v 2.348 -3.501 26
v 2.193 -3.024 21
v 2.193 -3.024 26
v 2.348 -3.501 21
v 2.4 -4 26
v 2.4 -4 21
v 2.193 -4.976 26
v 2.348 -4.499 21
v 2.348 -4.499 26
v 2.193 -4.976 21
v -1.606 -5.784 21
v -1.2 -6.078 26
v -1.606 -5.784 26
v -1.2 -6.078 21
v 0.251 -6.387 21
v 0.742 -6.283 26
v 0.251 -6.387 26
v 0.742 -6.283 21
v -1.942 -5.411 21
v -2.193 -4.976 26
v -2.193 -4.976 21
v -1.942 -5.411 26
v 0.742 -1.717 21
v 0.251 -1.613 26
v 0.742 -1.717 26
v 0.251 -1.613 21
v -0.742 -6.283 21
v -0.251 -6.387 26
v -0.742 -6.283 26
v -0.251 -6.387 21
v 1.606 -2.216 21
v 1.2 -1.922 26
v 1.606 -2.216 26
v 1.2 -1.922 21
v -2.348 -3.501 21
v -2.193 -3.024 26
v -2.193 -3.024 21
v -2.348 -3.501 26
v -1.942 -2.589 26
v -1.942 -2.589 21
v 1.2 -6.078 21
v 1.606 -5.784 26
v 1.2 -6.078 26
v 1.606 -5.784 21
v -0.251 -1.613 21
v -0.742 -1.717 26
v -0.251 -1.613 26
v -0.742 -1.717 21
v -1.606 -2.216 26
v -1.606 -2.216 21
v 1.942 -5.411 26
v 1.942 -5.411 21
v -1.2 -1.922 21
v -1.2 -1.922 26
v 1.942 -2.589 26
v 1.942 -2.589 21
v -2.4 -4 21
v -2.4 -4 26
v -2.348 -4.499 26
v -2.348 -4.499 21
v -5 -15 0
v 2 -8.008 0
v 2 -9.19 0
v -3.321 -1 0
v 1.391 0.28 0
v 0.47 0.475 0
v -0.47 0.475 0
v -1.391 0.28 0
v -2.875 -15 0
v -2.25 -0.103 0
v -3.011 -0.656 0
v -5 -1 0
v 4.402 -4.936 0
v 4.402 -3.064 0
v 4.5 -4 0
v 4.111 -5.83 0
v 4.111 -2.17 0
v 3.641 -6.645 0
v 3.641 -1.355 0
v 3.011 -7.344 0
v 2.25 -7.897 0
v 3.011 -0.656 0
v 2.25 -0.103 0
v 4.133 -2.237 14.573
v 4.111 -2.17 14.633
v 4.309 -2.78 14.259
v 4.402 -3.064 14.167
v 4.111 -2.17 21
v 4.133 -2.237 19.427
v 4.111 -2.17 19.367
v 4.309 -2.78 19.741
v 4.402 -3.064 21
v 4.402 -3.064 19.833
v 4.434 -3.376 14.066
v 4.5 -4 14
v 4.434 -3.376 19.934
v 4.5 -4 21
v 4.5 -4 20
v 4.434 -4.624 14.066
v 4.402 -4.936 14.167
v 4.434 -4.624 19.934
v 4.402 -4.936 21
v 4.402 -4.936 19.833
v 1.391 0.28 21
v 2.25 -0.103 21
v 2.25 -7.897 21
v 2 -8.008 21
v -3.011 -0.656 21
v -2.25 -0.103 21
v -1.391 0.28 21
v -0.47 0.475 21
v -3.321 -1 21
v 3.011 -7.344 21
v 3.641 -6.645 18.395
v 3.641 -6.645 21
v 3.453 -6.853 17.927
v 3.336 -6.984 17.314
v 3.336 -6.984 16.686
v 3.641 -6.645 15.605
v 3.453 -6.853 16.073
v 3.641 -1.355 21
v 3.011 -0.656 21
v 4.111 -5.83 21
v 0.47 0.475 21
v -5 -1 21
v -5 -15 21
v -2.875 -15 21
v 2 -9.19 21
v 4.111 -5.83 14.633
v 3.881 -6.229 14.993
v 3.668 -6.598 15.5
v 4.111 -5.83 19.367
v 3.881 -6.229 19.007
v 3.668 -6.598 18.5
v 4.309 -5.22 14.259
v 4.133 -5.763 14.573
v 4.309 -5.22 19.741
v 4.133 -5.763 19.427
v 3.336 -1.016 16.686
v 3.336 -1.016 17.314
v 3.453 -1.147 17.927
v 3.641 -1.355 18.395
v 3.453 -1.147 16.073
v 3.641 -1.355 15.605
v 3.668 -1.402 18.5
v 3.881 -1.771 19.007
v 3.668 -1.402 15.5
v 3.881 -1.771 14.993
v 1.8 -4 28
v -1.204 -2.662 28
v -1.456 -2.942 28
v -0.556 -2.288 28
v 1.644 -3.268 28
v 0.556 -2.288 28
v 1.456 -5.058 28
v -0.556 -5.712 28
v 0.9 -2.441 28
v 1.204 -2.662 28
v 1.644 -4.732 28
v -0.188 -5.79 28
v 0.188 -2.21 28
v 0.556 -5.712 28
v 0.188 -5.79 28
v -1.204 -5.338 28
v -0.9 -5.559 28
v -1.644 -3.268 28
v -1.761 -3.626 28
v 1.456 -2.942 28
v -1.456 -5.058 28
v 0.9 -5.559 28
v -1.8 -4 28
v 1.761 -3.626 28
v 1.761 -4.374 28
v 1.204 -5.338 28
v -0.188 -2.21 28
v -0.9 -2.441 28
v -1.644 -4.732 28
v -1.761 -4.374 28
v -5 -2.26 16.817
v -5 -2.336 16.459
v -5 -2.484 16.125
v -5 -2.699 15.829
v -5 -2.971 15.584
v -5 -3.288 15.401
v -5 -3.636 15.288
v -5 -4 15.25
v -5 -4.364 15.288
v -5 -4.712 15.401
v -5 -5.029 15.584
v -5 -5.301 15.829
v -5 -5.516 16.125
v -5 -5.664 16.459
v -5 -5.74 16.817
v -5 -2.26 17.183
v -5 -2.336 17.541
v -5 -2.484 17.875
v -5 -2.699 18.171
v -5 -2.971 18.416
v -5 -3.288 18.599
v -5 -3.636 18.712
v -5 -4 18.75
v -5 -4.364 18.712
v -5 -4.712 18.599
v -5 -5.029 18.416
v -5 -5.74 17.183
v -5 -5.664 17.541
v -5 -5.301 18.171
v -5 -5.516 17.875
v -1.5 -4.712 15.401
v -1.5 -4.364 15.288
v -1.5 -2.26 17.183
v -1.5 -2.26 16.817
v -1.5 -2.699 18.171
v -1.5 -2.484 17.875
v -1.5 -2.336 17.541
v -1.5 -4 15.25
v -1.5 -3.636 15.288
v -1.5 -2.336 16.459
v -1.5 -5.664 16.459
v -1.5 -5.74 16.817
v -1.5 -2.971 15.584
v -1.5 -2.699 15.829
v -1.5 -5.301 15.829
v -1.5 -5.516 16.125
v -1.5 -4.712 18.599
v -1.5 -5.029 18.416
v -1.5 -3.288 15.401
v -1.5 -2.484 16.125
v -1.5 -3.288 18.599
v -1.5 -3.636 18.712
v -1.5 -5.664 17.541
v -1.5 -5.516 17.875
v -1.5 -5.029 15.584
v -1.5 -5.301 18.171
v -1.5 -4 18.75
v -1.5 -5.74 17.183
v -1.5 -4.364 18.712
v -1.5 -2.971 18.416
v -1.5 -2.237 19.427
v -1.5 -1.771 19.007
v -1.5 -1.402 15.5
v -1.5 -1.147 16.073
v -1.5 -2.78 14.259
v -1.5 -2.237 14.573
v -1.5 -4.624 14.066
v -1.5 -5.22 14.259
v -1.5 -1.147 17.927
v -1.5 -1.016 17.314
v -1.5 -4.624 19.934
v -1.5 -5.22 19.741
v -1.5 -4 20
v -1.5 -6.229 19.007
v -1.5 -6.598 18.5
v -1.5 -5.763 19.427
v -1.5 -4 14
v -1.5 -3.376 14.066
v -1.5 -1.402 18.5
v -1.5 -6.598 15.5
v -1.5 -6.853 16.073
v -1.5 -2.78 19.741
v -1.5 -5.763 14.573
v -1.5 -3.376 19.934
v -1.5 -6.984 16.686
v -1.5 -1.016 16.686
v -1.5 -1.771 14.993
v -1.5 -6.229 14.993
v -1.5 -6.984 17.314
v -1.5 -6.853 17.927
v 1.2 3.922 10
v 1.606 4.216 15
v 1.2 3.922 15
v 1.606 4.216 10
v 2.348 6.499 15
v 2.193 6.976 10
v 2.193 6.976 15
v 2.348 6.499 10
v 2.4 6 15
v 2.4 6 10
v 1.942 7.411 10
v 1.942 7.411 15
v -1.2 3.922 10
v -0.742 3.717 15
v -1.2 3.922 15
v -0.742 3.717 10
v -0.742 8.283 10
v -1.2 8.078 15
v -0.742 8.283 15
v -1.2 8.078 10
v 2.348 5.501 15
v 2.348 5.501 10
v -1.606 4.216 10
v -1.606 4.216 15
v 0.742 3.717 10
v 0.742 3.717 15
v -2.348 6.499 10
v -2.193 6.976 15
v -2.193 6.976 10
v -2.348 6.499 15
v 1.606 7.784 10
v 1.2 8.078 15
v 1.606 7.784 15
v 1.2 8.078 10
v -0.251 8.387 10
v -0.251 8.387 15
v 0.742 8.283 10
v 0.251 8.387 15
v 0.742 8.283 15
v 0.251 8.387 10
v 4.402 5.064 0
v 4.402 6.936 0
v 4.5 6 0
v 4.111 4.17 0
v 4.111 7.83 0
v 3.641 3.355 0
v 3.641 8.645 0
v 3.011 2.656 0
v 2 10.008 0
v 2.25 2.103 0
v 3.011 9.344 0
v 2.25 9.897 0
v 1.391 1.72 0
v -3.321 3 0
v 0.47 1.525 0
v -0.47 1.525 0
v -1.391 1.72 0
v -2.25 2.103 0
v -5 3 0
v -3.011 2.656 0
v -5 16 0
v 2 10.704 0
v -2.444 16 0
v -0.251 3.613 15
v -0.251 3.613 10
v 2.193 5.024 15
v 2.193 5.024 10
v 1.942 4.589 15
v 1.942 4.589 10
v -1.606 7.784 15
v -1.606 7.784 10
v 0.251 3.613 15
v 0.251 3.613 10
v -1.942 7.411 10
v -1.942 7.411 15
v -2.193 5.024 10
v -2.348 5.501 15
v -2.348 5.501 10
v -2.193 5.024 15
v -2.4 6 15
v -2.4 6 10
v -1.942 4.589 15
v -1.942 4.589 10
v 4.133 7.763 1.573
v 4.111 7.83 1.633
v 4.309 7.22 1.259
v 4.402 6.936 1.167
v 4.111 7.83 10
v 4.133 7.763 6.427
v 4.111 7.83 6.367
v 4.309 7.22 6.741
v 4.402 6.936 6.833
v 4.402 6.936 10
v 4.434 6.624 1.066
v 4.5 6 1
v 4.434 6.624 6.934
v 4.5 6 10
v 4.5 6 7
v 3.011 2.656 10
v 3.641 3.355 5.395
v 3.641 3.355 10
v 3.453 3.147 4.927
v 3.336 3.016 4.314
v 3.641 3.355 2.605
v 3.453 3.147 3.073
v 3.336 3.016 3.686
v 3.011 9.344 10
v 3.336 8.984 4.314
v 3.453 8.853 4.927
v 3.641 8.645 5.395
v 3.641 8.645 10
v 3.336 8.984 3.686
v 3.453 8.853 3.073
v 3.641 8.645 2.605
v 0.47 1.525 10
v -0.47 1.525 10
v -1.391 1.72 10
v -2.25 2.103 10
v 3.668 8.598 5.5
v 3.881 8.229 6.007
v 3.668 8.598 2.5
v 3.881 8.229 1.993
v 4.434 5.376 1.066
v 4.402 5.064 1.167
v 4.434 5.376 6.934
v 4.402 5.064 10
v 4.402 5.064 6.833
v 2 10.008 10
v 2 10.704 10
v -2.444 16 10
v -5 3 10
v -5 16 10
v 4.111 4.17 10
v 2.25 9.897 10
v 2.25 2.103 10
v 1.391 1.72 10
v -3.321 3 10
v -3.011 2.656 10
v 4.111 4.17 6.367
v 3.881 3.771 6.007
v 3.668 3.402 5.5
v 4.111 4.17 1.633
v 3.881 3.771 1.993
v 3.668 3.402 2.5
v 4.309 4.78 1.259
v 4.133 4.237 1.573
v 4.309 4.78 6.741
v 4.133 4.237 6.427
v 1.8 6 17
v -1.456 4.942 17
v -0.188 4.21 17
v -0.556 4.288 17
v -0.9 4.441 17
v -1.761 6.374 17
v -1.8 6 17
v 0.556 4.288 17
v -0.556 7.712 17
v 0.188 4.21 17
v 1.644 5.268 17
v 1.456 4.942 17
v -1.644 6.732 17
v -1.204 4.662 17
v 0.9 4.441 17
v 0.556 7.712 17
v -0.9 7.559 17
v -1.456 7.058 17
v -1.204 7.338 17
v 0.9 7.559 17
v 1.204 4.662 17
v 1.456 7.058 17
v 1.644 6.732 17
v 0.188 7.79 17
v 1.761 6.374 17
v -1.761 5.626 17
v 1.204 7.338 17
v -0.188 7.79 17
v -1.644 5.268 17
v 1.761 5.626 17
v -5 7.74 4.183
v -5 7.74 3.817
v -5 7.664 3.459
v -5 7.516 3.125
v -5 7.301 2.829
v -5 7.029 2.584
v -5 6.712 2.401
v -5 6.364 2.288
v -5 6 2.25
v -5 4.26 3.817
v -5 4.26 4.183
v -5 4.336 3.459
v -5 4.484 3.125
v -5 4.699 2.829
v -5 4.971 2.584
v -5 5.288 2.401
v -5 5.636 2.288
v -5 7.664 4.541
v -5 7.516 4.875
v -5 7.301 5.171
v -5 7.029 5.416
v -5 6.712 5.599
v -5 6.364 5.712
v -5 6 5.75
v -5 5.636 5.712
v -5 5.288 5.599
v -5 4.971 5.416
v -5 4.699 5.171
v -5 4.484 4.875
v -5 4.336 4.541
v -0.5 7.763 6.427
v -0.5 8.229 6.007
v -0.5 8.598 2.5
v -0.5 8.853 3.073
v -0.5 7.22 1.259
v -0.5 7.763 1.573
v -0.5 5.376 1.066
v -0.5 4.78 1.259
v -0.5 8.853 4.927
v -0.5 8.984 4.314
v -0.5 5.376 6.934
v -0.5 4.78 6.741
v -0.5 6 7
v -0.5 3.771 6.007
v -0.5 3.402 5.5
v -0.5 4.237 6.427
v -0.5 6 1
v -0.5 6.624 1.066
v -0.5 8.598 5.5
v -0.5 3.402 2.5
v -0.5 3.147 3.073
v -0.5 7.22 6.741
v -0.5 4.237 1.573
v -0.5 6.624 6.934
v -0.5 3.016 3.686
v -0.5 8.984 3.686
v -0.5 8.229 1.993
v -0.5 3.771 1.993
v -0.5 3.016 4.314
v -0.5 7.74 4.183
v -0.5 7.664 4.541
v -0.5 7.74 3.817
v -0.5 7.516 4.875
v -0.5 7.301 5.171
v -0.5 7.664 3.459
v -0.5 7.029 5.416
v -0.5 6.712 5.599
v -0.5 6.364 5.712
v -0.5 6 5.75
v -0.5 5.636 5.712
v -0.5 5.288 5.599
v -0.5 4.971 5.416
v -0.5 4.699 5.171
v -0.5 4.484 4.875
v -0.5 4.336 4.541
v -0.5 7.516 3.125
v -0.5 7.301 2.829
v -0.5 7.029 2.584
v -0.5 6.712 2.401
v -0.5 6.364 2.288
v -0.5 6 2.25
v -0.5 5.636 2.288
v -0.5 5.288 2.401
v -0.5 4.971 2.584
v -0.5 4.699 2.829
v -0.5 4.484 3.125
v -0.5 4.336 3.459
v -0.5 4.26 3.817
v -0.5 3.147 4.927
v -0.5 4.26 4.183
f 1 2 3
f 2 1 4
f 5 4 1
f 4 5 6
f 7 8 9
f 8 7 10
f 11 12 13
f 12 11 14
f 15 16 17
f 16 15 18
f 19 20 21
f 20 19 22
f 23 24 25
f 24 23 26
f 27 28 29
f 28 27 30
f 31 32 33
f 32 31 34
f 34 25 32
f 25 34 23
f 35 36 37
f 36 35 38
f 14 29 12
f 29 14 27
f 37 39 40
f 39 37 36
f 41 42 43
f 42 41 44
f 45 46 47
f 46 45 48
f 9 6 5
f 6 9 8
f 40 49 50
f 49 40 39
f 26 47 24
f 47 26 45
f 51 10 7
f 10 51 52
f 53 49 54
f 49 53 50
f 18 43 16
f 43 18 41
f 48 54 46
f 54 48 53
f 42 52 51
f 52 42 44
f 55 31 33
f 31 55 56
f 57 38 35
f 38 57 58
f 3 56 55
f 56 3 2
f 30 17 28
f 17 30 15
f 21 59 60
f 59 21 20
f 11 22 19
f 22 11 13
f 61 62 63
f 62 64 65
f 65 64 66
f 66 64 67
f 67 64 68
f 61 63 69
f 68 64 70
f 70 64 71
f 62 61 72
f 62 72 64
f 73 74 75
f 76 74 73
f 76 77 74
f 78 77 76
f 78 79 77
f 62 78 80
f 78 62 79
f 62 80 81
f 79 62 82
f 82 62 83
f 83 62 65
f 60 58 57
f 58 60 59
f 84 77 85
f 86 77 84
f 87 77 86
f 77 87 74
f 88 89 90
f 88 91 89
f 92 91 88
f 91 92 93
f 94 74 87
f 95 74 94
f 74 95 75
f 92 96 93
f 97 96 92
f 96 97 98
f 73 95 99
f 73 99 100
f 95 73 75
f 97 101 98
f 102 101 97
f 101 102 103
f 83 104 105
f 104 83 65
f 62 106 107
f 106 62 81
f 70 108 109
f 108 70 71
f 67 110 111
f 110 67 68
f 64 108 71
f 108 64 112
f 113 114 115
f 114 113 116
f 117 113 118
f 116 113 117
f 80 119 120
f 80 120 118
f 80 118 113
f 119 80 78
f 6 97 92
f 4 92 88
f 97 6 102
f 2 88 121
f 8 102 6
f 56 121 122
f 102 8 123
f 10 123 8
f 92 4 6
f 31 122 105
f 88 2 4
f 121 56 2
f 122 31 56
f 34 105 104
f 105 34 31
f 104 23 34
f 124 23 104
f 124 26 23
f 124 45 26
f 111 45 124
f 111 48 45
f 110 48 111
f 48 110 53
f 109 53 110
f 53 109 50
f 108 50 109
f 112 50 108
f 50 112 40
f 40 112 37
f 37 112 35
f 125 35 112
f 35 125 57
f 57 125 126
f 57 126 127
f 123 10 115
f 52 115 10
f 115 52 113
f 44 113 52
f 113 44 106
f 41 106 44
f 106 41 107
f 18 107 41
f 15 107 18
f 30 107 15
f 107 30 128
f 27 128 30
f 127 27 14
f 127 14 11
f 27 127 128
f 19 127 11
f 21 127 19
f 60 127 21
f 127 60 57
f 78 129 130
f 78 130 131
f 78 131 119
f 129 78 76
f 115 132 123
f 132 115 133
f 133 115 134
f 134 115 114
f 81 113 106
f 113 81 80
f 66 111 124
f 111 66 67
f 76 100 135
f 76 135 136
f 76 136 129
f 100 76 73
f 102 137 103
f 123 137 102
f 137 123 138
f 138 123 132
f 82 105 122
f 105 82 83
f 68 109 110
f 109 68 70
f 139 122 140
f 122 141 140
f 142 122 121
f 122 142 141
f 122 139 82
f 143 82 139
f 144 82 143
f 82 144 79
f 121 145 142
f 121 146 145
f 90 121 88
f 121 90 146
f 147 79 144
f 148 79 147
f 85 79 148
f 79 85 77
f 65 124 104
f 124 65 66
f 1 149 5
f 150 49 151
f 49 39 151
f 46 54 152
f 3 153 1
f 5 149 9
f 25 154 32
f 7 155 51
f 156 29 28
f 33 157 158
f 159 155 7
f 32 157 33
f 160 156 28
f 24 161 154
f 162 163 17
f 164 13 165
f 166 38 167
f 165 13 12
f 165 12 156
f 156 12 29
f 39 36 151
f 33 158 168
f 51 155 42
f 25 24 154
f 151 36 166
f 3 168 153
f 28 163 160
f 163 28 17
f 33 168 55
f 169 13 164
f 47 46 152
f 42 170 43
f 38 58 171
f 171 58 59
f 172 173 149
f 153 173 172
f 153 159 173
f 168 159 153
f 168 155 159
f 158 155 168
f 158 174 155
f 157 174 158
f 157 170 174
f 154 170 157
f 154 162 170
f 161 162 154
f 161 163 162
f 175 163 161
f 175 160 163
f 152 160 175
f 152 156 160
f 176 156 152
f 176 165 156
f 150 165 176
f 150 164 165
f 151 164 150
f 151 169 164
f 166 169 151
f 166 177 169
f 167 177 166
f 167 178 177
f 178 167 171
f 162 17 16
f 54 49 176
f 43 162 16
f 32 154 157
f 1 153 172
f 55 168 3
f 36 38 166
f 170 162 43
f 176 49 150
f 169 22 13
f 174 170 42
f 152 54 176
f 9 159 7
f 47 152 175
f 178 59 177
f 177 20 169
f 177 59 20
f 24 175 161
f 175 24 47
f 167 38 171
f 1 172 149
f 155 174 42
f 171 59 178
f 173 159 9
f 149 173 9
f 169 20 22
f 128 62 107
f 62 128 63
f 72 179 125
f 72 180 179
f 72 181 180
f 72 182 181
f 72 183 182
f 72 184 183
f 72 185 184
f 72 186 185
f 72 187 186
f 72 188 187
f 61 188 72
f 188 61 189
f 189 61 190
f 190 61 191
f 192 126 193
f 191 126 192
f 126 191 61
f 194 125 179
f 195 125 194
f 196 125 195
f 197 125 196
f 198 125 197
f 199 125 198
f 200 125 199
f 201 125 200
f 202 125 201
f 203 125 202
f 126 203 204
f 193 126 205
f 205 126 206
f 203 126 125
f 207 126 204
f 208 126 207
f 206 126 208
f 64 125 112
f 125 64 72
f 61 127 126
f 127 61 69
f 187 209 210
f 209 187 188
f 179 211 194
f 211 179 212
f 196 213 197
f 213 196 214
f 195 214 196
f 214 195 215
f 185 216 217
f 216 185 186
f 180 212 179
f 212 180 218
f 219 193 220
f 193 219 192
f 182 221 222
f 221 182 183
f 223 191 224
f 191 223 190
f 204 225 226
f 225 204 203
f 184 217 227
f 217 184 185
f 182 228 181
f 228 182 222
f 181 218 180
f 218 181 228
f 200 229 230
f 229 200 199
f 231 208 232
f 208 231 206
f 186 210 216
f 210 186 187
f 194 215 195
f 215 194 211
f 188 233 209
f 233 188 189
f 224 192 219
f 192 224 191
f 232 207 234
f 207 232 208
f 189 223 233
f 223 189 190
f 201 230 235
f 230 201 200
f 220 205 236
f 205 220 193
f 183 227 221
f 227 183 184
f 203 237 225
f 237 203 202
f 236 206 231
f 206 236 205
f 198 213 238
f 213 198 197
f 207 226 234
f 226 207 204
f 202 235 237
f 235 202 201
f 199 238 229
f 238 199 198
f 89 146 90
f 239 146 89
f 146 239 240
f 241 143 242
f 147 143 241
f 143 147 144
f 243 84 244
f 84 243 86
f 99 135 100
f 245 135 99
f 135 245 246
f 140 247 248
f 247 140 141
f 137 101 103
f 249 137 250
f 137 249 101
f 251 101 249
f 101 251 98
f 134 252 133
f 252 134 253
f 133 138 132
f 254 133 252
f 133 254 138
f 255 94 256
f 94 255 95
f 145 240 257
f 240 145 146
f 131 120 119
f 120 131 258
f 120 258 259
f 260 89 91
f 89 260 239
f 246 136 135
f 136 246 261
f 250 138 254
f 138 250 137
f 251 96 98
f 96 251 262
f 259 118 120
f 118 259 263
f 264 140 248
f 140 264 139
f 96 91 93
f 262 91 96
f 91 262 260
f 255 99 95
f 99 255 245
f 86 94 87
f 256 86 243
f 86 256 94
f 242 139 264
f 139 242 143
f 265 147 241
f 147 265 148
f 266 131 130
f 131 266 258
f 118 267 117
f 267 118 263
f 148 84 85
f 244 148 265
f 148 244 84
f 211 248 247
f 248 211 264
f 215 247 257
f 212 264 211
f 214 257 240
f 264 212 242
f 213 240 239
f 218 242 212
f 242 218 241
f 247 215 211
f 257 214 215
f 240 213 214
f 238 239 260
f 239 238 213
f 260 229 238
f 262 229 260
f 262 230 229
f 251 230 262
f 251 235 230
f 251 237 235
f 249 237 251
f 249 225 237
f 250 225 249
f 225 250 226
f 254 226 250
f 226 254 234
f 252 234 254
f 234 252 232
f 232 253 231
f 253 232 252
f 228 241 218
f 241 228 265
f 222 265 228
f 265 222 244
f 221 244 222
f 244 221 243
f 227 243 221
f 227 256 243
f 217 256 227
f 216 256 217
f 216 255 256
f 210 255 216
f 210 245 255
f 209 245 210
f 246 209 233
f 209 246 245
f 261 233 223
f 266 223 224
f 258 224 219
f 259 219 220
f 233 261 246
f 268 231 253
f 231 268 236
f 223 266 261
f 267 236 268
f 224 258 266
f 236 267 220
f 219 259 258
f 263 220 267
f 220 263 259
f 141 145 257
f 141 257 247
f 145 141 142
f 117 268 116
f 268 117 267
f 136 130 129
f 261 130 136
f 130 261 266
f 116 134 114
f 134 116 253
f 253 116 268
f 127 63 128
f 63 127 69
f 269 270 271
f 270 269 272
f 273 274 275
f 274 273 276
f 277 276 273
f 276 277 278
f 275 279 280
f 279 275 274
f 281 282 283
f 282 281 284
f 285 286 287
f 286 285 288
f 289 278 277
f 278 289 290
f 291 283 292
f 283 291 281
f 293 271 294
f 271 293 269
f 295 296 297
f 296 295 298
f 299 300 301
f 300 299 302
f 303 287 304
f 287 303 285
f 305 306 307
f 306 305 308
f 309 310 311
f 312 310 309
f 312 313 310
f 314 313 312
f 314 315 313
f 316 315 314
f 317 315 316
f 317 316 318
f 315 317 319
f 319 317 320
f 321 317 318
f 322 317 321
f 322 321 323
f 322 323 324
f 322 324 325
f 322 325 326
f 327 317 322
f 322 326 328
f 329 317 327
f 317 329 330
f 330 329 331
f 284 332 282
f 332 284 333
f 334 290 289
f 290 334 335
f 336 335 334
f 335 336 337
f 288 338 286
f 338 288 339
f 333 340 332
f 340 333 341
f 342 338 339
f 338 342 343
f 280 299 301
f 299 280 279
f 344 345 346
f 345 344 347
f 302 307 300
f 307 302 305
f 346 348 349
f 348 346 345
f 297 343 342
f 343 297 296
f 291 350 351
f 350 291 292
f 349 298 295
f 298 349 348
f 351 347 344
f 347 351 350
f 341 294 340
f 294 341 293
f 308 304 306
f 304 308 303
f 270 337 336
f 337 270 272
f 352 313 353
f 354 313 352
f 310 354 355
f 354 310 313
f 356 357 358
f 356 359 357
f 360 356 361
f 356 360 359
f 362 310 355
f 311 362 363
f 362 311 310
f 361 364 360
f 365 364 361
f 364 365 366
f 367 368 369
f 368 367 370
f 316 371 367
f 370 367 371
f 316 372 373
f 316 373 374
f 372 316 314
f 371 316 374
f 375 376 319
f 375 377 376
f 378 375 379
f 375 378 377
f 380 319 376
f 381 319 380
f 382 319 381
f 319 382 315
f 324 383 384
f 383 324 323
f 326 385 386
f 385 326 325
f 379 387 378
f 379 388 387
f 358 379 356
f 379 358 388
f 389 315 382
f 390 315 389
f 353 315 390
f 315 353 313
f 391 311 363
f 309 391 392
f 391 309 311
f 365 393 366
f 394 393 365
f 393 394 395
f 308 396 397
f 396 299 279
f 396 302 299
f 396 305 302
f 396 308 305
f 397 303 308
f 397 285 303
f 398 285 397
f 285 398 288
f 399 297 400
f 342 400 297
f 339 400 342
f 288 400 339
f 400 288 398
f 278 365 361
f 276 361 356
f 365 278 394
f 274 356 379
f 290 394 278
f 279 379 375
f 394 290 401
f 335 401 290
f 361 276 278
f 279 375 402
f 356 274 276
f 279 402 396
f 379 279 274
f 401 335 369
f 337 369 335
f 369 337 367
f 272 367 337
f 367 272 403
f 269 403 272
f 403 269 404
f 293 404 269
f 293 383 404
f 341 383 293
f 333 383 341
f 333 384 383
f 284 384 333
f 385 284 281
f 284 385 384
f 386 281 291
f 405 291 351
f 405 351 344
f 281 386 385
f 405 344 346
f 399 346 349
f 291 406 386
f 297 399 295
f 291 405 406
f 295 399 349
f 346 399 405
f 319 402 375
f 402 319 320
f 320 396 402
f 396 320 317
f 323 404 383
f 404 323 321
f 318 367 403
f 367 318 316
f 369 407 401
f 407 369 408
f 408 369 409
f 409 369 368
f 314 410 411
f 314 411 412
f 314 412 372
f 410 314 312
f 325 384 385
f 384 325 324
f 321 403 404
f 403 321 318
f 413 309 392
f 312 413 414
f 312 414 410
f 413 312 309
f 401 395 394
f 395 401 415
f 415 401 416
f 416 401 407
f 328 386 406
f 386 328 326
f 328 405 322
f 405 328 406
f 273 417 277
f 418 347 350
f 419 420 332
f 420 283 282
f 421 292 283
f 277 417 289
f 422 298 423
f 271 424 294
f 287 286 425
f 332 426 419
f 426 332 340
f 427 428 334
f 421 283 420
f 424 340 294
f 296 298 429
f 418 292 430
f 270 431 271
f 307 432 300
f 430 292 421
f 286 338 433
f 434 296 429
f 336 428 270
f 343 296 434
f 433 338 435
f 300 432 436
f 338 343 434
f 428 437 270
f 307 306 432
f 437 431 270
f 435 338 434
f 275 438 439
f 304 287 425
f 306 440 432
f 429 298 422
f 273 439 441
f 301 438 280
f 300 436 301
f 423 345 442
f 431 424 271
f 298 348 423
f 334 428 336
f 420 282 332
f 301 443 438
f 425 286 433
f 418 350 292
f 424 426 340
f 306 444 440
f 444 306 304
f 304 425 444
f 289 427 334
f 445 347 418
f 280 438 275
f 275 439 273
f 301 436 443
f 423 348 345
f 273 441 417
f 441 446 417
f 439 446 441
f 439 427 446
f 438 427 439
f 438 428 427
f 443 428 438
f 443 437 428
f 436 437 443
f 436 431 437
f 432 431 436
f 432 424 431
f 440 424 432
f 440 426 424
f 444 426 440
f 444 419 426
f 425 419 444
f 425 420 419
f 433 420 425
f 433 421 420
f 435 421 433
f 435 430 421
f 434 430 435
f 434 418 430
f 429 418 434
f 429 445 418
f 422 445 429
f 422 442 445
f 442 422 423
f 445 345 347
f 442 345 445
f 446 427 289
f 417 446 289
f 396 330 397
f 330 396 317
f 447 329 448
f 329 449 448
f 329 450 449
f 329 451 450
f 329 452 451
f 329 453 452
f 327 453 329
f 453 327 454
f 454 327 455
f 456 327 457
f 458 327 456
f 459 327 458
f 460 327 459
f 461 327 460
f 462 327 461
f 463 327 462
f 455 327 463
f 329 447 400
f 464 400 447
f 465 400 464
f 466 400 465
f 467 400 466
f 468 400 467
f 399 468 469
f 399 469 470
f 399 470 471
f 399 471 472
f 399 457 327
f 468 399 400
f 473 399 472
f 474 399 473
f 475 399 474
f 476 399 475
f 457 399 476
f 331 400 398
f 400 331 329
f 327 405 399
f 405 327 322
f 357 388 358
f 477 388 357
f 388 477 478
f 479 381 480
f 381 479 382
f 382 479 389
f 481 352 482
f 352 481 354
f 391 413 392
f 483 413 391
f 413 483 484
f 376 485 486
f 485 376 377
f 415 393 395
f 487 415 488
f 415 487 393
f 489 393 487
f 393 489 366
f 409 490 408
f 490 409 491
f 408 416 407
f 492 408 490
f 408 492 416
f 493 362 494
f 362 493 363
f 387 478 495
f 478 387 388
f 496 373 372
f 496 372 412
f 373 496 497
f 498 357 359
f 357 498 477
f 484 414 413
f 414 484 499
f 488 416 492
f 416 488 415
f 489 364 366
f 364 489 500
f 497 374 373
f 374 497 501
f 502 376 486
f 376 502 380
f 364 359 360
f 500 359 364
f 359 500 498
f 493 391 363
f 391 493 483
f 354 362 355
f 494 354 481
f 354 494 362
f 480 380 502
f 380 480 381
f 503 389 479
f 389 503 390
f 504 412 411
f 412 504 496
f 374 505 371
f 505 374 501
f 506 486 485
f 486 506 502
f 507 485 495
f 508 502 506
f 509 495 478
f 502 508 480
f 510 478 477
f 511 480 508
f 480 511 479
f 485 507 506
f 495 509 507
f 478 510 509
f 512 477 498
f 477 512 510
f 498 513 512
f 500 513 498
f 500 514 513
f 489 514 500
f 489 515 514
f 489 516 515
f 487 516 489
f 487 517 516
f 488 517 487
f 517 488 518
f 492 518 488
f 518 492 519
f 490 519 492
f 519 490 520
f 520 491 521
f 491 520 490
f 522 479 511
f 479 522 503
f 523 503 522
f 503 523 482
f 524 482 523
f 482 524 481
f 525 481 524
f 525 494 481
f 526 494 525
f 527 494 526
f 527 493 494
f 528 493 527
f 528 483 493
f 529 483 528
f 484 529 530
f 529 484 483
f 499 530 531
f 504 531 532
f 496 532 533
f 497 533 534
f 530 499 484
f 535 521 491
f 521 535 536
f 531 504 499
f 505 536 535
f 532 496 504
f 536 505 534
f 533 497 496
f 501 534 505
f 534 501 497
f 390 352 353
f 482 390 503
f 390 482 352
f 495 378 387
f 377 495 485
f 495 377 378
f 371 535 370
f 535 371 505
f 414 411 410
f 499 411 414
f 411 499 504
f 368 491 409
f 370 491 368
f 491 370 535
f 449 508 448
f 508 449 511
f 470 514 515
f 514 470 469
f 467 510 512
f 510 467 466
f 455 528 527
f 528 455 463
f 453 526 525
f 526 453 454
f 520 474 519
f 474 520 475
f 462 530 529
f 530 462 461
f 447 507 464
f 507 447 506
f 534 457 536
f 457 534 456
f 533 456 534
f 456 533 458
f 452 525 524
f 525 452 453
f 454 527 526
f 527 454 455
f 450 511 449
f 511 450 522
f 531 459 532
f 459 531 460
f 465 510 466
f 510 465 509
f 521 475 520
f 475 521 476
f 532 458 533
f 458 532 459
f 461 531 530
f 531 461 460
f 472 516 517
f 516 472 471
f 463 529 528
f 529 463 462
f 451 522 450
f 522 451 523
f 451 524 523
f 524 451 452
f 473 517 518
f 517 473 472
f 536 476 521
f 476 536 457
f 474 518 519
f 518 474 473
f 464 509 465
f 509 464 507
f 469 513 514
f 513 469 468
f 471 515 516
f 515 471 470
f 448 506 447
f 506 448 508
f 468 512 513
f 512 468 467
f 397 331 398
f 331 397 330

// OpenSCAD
// PRUSA iteration4
// RAMBo cover hinges
// GNU GPL v3
// Josef Průša <iam@josefprusa.cz> and contributors
// http://www.reprap.org/wiki/Prusa_Mendel
// http://prusamendel.org

module upper_hinge(){
    difference(){
        union(){
            // Body
            cylinder(h=26,r=2.4,$fn=30);
            cylinder(h=21,r=4.5,$fn=30);
            translate([0,0,26]) cylinder(h=2,r1=2.4,r2=1.8,$fn=30);
            translate([-5,-11,0]) cube([7,14,21 ]);
        }

        // M3 screw hole
        translate([-12.5,-0,17]) rotate( [0,90,0] ) cylinder(h=20,r=1.75,$fn=30);
        translate([-1.5,-0,17]) rotate( [0,90,0] ) cylinder(h=9,r=3,$fn=30);

        // Angle cut
        translate([-3.9,-20,-1]) rotate([0,0,50]) cube([25,5,26]);
    }
}

module lower_hinge(){
    difference(){
        union(){
            // Body
            translate([0,6,0]) cylinder(h=15,r=2.4,$fn=30);
            translate([0,6,0]) cylinder(h=10,r=4.5,$fn=30);
            translate([0,6,15]) cylinder(h=2,r1=2.4,r2=1.8,$fn=30);
            translate([-5,3,0]) cube([7,13,10]);
        }

        // M3 screw
        translate([-0.5,6,4]) rotate([0,90,0]) cylinder(h=20,r=3,$fn=30);
        translate([-12,6,4]) rotate([0,90,0]) cylinder(h=20,r=1.75,$fn=30);

        // Angle cut
        translate([-5.8,20,-1]) rotate([0,0,-50]) cube([20,5,20]);
    }
}

translate([0,-4,0]) upper_hinge();
lower_hinge();
